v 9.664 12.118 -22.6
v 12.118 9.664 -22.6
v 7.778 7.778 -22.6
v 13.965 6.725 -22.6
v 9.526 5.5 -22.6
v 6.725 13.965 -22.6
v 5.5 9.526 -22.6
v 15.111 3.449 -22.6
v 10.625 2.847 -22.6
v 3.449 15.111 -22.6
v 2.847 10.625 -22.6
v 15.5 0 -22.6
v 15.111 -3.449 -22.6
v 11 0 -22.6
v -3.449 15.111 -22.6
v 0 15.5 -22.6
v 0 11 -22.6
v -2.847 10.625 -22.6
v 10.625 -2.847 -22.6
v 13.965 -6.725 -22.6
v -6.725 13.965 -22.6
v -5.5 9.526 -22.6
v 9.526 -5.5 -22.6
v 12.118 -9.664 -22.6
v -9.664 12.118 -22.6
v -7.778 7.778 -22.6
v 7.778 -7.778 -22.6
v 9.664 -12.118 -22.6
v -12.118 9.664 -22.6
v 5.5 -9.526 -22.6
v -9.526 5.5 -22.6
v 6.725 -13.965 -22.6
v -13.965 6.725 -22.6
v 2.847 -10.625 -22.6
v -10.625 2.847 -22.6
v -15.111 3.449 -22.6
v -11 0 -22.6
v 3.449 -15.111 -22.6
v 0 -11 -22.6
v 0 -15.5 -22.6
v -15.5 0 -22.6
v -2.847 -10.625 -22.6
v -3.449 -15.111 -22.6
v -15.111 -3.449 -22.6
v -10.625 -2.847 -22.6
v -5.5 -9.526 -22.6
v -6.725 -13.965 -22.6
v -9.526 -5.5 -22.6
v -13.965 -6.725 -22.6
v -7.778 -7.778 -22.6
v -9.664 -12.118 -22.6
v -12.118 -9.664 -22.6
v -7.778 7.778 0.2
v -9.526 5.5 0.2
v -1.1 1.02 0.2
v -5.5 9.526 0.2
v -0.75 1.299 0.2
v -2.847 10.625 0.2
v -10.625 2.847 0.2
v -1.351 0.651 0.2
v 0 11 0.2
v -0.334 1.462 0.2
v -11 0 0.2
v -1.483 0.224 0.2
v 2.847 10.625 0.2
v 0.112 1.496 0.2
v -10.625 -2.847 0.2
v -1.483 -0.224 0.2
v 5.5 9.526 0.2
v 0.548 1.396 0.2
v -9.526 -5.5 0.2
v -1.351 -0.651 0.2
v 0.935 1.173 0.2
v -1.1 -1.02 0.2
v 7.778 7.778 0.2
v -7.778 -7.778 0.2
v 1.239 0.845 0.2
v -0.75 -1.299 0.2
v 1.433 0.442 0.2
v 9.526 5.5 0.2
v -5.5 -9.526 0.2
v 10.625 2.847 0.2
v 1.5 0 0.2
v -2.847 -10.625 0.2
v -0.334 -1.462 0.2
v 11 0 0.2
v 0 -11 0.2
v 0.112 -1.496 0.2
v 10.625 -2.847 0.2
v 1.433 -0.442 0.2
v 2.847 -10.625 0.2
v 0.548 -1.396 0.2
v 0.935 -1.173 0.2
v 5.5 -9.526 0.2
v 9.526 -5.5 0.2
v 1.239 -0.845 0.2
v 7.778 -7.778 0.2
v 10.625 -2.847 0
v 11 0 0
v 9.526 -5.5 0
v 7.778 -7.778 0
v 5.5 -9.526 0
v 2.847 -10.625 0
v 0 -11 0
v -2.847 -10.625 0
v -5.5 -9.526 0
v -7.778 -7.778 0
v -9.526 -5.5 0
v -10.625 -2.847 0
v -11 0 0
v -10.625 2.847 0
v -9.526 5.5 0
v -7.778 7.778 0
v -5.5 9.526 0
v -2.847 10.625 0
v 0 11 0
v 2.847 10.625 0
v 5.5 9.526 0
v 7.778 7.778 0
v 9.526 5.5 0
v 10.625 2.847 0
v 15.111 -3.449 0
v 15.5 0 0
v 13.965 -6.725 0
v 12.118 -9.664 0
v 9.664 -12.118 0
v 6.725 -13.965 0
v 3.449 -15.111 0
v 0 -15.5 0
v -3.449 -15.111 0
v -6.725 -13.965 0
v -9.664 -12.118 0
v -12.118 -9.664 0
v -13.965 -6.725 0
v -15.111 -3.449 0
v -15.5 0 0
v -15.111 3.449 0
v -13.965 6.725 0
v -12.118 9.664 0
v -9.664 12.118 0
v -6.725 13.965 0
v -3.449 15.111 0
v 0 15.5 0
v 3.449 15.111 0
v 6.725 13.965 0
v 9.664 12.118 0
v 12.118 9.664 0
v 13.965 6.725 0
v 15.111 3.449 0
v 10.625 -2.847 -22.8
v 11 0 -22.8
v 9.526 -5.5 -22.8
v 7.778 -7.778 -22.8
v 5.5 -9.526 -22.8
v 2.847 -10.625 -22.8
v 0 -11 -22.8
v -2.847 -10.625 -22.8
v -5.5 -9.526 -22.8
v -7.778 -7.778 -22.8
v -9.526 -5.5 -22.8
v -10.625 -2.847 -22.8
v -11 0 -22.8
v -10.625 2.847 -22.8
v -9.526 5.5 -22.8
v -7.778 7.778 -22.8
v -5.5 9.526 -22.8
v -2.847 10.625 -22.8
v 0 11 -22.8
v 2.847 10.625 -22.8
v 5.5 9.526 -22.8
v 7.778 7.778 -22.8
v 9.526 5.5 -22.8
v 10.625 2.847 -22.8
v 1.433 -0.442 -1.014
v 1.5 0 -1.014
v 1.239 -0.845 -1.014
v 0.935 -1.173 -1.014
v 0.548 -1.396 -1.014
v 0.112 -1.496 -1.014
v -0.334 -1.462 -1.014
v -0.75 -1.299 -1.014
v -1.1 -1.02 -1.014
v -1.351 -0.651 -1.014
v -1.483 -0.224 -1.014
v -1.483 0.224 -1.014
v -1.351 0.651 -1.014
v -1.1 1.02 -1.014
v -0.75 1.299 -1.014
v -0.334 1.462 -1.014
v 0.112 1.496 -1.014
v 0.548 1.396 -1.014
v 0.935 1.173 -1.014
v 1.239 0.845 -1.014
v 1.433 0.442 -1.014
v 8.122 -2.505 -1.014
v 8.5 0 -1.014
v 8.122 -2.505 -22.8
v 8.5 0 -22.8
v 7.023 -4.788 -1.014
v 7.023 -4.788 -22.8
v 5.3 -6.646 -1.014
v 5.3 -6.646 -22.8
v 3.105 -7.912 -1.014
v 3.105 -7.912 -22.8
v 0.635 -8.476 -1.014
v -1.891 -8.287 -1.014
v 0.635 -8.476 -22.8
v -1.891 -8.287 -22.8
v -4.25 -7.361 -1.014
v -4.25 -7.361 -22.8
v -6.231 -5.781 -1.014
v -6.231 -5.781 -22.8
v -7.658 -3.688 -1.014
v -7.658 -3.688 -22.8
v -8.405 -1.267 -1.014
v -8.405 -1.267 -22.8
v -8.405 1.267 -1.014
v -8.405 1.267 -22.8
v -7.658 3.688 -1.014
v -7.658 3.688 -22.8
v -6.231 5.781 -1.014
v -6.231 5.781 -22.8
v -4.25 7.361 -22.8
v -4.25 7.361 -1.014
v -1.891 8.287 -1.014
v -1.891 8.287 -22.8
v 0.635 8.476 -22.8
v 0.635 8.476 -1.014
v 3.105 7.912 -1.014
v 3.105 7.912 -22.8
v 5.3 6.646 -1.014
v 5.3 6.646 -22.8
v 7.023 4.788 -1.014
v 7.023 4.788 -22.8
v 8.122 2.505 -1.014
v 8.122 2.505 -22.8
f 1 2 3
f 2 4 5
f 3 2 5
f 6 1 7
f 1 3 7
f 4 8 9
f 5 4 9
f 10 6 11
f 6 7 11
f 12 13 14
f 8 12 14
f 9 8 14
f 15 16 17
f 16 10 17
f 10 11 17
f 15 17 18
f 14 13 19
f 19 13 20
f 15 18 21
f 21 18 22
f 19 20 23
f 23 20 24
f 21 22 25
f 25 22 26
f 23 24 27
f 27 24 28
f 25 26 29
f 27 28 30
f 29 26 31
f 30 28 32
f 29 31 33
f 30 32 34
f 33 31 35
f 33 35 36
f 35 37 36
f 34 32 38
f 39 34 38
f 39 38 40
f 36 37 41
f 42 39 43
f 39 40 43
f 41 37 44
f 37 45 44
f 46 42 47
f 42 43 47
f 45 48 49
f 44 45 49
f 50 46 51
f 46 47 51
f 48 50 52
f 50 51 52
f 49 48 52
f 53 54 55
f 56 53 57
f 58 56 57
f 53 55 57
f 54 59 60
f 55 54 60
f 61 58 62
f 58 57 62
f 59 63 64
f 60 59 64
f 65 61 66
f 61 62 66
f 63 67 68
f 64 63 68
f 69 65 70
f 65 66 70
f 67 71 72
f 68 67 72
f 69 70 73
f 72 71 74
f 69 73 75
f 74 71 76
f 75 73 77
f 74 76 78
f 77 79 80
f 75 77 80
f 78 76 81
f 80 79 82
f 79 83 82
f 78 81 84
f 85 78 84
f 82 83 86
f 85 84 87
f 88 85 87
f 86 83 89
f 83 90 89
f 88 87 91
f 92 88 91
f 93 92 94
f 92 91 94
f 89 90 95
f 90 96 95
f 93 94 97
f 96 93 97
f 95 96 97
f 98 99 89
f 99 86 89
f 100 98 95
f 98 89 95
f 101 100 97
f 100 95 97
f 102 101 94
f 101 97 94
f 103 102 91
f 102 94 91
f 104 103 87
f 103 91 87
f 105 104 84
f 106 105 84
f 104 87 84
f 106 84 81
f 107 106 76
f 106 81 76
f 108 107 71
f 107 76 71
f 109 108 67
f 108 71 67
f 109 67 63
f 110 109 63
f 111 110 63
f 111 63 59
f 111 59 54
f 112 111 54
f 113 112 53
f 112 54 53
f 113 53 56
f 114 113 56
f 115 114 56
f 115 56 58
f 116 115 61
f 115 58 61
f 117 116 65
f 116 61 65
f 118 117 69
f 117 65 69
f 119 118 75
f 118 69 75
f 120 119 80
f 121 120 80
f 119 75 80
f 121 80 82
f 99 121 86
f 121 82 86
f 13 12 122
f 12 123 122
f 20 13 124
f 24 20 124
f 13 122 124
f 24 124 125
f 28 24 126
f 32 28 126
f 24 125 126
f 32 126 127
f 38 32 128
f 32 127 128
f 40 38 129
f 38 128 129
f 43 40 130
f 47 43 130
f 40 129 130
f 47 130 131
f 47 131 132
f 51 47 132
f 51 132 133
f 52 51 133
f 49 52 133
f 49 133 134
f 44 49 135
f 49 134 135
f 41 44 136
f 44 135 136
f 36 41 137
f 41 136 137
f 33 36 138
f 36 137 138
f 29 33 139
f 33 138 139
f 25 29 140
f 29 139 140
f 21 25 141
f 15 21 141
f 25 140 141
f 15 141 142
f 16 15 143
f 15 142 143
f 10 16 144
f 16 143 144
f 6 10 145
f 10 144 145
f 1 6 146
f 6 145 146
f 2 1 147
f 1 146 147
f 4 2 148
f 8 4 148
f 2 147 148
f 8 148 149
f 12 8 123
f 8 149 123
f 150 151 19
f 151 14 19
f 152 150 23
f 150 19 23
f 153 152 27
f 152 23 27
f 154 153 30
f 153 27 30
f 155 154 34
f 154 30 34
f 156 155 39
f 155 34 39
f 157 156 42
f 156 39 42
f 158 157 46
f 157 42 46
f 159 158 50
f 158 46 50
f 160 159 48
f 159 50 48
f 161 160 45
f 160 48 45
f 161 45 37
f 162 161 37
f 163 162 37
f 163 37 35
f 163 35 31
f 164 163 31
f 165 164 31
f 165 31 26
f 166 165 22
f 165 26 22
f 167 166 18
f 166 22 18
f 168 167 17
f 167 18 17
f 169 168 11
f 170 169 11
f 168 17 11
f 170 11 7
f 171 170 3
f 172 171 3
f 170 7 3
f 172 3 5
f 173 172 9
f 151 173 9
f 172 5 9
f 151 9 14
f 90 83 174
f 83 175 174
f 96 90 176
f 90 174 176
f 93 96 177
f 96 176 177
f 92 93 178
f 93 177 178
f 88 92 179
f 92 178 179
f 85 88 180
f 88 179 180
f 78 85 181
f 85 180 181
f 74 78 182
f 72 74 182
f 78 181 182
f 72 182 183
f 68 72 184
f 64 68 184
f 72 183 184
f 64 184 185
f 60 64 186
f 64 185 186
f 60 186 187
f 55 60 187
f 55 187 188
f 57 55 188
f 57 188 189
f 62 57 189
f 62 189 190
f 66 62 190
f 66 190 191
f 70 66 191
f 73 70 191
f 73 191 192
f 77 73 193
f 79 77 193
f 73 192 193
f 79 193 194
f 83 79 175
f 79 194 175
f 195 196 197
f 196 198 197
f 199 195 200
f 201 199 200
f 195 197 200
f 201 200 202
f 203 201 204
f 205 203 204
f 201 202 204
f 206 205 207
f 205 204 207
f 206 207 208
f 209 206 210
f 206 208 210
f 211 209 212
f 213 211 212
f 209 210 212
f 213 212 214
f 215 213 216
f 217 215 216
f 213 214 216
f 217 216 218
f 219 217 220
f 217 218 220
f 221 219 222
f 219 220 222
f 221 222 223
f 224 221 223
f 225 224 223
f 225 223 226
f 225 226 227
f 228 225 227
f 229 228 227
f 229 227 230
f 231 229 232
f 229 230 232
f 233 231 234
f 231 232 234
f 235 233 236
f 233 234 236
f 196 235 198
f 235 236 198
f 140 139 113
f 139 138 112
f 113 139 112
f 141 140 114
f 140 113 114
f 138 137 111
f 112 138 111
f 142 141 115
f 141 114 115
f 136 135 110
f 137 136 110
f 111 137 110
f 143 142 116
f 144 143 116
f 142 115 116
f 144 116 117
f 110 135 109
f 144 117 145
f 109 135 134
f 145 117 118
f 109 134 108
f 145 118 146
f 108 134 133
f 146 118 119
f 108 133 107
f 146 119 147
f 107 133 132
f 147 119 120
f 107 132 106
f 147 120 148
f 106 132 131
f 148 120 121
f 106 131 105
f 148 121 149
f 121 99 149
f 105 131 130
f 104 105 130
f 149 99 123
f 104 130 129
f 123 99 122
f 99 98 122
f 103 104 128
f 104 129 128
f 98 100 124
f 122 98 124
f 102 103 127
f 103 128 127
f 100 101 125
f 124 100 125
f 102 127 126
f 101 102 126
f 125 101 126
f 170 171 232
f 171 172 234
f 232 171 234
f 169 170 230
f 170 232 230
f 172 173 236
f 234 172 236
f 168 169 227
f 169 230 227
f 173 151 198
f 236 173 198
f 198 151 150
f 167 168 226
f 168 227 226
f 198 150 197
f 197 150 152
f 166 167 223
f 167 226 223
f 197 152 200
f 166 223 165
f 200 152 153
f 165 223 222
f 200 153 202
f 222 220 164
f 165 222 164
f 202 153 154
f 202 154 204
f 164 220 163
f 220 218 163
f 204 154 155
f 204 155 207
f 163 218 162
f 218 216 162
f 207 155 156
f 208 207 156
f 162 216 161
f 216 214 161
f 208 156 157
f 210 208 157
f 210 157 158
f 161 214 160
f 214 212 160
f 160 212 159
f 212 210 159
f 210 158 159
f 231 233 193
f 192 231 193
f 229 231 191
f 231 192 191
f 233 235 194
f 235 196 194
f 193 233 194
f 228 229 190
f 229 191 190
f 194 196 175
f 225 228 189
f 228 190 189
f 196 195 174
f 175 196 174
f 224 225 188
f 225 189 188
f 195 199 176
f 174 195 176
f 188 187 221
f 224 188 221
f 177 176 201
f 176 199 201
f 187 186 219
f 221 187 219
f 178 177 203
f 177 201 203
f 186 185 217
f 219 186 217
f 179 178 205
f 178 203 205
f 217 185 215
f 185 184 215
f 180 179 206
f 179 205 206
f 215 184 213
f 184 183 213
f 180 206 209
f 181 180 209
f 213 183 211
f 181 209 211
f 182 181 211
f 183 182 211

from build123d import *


with BuildPart() as part:
    # Croquis1 → Revolución1 (revolve)
    with BuildSketch(Plane(origin=(0, 0, 0), x_dir=(1, 0, 0), z_dir=(0, 1, 0))):
        Polygon((1.5, 1.013513514), (8.5, 1.013513514), (8.5, 22.8), (11, 22.8), (11, 22.6), (15.5, 22.6), (15.5, 0), (11, 0), (11, -0.2), (1.5, -0.2), align=None)
    revolve(axis=Axis((0, 0, 0), (0, 0, -1)))


solid = part.part
